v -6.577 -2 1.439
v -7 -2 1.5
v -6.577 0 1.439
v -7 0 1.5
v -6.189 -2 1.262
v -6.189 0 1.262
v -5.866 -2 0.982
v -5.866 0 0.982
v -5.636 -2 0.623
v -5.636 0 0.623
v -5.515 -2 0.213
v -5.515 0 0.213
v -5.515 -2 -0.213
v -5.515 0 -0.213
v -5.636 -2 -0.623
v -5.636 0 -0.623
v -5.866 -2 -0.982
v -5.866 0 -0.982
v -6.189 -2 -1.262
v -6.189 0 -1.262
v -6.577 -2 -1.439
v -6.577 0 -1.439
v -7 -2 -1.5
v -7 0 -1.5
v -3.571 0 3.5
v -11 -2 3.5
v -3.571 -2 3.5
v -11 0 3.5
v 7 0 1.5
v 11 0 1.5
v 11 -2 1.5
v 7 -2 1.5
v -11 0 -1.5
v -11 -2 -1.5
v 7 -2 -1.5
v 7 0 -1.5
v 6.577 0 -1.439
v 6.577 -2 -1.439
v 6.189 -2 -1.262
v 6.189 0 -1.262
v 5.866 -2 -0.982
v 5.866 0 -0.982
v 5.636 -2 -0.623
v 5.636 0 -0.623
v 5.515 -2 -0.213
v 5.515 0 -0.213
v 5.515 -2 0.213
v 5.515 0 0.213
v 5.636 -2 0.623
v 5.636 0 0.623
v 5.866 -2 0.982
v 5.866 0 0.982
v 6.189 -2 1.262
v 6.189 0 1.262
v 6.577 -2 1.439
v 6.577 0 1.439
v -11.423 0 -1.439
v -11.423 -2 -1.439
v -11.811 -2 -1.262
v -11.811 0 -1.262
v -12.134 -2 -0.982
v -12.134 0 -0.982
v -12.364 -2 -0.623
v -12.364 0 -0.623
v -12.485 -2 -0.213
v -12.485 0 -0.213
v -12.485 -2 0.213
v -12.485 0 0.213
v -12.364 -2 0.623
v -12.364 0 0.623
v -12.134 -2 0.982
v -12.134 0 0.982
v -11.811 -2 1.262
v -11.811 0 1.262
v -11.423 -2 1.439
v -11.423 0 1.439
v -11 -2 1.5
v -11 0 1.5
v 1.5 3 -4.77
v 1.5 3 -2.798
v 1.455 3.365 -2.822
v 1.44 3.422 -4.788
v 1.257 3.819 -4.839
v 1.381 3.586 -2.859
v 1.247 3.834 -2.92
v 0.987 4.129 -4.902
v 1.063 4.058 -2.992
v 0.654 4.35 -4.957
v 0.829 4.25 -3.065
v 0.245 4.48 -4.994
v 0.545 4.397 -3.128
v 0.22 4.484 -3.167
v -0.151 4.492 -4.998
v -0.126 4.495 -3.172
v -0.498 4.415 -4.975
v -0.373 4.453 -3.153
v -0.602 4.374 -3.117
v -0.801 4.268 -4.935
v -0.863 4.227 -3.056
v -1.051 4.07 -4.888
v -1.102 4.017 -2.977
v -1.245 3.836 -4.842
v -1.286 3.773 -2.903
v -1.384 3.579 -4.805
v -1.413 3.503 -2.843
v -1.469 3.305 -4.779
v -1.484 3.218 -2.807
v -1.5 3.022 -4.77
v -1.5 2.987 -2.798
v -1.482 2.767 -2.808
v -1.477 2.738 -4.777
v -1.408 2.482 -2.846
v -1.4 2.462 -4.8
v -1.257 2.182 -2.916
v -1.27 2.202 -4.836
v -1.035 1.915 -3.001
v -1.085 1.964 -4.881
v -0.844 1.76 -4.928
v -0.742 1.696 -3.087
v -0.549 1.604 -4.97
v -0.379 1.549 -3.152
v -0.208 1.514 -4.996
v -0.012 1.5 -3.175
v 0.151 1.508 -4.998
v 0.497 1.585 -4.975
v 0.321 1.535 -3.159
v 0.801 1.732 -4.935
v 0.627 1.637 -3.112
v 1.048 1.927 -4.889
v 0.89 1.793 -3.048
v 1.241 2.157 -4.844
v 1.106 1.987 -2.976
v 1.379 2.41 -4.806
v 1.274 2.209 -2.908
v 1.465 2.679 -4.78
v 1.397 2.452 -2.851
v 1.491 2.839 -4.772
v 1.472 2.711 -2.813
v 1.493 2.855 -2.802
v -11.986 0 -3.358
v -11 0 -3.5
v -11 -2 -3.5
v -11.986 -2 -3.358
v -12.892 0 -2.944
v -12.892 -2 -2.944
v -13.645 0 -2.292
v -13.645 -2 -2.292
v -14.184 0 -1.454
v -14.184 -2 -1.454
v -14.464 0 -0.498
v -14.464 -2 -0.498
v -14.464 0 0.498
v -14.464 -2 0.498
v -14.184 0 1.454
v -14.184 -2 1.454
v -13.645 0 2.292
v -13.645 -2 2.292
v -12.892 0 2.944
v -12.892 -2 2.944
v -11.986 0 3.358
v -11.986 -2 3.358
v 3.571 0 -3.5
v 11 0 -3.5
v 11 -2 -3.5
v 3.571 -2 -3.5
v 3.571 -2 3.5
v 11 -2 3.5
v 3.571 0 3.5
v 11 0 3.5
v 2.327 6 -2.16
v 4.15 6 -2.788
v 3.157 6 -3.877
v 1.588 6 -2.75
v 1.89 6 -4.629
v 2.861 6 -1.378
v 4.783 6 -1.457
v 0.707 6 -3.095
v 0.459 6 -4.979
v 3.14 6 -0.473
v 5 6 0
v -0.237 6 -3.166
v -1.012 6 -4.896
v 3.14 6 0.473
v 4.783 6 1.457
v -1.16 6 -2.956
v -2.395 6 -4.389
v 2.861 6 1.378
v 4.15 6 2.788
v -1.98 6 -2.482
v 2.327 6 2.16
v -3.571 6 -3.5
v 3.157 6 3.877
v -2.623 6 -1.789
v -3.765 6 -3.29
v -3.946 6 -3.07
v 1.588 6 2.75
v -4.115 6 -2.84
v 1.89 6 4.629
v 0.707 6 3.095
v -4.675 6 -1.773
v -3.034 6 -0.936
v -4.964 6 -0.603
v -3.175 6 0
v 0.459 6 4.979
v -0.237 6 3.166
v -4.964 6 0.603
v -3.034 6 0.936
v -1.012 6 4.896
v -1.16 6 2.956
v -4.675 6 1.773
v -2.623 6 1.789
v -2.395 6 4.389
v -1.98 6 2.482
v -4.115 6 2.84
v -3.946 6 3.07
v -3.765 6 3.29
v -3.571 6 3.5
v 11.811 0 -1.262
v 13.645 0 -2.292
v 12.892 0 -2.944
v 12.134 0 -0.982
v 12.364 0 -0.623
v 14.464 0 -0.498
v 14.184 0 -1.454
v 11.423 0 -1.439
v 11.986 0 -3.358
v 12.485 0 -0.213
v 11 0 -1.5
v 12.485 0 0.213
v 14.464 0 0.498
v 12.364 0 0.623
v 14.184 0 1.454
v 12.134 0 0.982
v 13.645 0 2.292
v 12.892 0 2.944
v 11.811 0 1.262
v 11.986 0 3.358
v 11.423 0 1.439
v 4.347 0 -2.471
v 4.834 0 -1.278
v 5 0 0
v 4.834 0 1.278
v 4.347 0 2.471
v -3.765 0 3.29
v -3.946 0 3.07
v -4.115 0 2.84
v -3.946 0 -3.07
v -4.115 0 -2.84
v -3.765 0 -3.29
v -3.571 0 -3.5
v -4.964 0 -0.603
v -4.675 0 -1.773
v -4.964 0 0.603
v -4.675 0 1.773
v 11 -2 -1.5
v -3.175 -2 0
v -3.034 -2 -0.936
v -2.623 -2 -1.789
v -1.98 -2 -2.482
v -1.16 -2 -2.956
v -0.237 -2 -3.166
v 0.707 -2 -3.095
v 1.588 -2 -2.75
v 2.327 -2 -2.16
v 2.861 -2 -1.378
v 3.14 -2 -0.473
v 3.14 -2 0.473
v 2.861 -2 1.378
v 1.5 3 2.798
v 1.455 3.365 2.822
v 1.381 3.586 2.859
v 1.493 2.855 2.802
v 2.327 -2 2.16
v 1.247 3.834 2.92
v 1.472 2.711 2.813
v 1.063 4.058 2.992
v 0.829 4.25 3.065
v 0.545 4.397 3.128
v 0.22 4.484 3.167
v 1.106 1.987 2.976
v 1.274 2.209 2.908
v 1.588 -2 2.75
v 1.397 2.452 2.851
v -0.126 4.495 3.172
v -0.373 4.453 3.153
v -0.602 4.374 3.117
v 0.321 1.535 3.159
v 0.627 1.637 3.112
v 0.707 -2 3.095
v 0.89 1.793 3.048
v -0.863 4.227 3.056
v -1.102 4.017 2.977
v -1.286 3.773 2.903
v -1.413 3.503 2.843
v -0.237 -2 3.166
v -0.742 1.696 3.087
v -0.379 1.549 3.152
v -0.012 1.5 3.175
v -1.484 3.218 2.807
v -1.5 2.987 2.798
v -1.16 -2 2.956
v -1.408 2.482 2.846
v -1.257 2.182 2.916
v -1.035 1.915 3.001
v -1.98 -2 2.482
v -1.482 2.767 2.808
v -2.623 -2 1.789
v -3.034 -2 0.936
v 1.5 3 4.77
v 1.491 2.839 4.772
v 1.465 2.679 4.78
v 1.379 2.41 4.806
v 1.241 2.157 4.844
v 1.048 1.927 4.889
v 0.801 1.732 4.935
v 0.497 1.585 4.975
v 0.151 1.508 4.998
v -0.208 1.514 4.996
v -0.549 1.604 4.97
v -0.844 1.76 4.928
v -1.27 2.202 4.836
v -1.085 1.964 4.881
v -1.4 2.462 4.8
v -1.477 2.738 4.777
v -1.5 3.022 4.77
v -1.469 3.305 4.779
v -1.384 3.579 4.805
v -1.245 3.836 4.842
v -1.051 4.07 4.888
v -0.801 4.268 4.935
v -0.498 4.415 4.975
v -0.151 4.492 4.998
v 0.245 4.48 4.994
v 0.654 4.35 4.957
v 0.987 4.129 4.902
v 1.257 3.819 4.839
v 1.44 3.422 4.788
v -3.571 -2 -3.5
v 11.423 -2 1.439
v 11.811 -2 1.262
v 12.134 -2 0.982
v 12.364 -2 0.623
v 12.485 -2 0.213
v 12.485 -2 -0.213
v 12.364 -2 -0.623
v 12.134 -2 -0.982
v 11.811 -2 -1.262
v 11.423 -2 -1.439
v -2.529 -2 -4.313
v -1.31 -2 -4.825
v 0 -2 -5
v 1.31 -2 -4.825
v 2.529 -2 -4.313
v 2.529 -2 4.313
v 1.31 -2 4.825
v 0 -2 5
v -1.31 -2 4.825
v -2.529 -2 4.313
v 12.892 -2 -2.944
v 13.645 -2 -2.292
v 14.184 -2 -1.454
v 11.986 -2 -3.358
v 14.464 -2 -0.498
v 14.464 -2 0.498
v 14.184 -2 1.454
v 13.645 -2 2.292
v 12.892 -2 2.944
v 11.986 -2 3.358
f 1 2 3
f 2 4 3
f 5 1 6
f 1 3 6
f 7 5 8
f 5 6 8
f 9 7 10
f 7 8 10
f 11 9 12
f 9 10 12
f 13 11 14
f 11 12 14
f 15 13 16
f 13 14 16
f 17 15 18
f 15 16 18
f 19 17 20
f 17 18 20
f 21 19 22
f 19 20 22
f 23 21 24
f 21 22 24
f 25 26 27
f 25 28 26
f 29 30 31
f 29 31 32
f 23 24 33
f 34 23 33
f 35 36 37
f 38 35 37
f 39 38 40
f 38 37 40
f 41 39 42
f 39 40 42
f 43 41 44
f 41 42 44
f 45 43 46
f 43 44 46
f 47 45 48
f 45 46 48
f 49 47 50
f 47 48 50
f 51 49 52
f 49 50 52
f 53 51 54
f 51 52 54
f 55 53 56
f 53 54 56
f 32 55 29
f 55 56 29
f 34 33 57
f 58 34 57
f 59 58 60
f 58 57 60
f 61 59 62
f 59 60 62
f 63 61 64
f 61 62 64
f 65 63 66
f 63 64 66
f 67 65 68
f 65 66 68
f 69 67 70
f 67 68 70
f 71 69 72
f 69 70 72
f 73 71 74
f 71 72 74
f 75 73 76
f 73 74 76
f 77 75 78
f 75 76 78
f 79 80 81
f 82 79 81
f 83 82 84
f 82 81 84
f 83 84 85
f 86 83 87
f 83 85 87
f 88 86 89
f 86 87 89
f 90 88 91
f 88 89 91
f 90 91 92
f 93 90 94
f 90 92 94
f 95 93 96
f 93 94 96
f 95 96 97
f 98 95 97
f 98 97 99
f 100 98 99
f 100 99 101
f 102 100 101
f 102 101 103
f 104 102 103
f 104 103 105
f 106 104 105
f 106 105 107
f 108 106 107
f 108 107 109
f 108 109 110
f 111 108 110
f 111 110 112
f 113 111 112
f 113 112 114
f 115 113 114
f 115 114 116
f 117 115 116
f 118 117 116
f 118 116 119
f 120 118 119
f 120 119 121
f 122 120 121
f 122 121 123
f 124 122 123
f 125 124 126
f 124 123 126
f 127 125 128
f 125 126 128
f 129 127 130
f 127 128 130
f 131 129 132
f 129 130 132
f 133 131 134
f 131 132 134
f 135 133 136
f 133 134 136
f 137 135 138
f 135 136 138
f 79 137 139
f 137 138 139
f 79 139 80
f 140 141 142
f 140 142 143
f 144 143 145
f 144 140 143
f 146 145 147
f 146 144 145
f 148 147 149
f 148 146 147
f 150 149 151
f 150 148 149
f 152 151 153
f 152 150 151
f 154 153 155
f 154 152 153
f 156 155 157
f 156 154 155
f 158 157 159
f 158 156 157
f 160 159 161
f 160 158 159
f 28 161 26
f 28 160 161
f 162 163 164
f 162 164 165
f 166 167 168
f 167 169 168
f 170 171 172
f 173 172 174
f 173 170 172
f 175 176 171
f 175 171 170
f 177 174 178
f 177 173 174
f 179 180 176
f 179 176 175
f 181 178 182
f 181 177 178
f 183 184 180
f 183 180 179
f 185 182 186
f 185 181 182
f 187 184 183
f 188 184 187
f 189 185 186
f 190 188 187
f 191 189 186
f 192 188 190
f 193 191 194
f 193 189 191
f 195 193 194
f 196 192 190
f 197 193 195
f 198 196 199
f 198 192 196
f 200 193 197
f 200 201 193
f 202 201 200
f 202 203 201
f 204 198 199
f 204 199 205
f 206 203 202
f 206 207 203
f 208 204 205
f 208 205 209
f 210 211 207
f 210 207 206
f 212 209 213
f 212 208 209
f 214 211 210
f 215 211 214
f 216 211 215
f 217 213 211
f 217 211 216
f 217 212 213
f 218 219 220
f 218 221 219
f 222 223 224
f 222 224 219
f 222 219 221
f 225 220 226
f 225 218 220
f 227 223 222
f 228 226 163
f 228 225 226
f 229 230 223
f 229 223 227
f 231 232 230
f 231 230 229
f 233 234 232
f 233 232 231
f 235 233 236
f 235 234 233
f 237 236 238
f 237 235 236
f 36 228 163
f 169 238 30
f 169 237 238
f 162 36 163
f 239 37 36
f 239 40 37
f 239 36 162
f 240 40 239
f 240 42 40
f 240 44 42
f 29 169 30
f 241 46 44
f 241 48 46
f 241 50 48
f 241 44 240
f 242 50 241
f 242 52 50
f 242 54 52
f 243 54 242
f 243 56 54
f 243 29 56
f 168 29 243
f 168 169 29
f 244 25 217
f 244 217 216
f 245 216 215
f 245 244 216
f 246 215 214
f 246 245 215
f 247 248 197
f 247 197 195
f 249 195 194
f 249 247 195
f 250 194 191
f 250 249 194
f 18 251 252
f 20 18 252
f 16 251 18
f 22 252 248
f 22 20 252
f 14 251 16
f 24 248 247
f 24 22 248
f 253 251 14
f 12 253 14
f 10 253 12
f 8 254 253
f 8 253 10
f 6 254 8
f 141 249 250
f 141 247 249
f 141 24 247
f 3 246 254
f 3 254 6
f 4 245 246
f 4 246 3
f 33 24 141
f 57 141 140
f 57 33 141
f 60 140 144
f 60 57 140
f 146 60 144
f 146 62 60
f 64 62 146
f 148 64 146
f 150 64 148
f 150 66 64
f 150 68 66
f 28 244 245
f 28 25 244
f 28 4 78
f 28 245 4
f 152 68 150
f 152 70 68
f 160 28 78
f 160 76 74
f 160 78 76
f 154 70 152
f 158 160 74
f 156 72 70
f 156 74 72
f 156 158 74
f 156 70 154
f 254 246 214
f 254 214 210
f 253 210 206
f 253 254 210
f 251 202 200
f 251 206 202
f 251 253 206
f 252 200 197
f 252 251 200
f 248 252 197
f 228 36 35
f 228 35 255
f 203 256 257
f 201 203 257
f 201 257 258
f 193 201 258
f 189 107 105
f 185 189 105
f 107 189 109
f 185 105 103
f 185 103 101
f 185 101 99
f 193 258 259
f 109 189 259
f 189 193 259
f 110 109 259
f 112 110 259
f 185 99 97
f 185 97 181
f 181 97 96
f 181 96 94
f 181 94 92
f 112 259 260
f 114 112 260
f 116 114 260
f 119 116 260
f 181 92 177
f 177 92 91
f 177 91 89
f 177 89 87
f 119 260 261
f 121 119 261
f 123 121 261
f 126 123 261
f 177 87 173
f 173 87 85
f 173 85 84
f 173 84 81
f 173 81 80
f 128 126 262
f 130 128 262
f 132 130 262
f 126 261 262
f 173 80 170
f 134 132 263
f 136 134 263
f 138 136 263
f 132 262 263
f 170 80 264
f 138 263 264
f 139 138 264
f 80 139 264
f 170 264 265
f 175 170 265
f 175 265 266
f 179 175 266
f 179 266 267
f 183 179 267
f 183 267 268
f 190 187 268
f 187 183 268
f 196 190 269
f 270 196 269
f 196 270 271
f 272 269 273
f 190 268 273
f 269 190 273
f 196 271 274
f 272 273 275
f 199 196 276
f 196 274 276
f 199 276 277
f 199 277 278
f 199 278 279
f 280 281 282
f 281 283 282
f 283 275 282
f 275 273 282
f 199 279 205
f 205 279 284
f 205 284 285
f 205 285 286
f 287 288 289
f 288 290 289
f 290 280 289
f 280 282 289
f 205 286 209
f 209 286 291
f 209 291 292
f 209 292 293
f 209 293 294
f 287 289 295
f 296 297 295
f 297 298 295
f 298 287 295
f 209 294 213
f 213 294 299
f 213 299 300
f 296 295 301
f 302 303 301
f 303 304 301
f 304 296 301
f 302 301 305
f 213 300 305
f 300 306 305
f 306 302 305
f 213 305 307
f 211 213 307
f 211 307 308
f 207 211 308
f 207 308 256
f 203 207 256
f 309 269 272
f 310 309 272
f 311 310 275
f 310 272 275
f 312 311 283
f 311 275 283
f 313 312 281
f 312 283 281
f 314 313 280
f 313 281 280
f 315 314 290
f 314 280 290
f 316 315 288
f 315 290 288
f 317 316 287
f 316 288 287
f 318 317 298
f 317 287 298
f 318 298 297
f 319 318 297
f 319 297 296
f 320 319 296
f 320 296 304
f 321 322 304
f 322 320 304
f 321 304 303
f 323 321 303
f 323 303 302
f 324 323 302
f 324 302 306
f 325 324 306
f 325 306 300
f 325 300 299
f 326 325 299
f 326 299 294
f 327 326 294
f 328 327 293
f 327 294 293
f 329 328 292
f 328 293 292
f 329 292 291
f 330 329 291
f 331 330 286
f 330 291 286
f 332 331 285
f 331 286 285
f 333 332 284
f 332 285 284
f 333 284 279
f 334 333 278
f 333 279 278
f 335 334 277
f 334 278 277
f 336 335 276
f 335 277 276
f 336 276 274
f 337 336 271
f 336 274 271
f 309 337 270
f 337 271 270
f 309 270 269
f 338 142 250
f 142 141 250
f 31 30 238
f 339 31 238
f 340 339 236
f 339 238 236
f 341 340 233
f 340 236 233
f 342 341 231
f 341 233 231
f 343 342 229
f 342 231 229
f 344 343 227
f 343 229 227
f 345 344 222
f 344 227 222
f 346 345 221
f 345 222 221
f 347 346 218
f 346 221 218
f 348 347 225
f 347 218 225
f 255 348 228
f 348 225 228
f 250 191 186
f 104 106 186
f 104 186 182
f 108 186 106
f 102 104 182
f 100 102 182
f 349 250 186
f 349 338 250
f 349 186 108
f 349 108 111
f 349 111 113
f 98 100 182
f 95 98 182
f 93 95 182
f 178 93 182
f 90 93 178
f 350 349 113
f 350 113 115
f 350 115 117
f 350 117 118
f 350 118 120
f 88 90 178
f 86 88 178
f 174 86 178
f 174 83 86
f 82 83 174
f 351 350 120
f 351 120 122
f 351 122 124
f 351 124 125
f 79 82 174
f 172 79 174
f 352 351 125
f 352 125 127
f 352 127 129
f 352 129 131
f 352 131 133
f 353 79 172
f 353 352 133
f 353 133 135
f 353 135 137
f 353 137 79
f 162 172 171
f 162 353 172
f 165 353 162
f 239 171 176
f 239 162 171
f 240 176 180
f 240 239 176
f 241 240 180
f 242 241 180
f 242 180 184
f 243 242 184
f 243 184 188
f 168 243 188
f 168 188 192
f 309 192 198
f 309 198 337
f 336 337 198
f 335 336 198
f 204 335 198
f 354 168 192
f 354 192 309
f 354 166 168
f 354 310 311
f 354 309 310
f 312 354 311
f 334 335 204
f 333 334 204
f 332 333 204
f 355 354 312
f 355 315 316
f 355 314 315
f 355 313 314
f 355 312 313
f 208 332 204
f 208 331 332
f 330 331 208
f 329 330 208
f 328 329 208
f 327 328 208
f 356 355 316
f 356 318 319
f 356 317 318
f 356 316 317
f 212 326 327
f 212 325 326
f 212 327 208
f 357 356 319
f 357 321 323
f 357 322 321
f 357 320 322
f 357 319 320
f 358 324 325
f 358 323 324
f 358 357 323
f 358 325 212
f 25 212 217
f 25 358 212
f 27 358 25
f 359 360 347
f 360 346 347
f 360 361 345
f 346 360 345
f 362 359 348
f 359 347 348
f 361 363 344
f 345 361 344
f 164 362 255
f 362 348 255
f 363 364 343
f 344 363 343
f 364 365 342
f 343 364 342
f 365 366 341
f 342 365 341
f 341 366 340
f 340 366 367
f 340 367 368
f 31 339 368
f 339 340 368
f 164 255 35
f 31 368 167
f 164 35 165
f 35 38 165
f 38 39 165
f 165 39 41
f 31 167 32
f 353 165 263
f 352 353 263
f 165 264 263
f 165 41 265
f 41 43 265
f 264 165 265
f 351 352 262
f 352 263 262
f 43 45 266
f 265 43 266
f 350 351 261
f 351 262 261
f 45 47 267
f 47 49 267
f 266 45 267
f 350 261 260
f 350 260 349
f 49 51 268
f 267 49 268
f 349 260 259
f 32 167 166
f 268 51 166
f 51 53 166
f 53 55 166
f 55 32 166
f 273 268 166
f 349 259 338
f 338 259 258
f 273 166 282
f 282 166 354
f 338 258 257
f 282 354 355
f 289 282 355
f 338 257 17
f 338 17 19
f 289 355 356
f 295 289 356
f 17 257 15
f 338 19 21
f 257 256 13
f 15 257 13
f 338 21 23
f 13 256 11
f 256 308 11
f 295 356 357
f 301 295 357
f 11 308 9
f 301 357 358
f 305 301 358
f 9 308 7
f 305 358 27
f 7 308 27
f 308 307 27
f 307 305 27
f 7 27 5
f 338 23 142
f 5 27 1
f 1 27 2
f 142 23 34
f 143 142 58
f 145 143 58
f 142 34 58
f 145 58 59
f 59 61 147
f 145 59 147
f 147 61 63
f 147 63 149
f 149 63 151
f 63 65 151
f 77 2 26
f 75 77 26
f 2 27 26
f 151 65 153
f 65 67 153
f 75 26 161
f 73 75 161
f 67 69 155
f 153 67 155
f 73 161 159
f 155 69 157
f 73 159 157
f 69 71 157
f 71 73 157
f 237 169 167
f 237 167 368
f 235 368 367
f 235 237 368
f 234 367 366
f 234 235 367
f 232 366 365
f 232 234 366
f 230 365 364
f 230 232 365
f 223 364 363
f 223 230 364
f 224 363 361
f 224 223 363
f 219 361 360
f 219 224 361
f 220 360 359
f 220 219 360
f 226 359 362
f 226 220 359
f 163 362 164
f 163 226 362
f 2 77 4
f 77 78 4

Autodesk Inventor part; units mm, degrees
ref_plane "YZ Plane" through (0, 0, 0) normal (1, 0, 0) x (0, 1, 0)
ref_plane "XZ Plane" through (0, 0, 0) normal (0, 1, 0) x (-1, 0, 0)
sketch "Sketch1" plane through (0, 0, 0) normal (0, 1, 0) x (-1, 0, 0)
  circle A0 centre (0, 0) radius 3.175
  arc A1 (4.1151, 2.84) -> (3.5707, 3.5) centre (0, 0) ccw
  arc A2 (-11, 3.5) -> (-11, -3.5) centre (-11, 0) ccw
  line L0 (0, 0) -> (0, -5) construction
  arc A3 (4.1151, -2.84) -> (4.1151, 2.84) centre (0, 0) ccw
  line L1 (-7, 0) -> (-11, 0) construction
  line L2 (-7, -1.5) -> (-11, -1.5)
  line L3 (-11, 1.5) -> (-7, 1.5)
  arc A4 (-7, -1.5) -> (-7, 1.5) centre (-7, 0) ccw
  arc A5 (-11, 1.5) -> (-11, -1.5) centre (-11, 0) ccw
  line L4 (-11, 3.5) -> (-3.5707, 3.5)
  line L5 (-11, -3.5) -> (-3.5707, -3.5)
  line L6 (0, 0) -> (0, 3.175) construction
  arc A6 (11, -3.5) -> (11, 3.5) centre (11, 0) ccw
  line L7 (7, -1.5) -> (11, -1.5)
  line L8 (11, 1.5) -> (7, 1.5)
  arc A7 (7, 1.5) -> (7, -1.5) centre (7, 0) ccw
  arc A8 (11, -1.5) -> (11, 1.5) centre (11, 0) ccw
  line L9 (11, 3.5) -> (3.5707, 3.5)
  line L10 (11, -3.5) -> (3.5707, -3.5)
  arc A9 (3.5707, 3.5) -> (3.5707, -3.5) centre (0, 0) ccw
  arc A10 (3.5707, -3.5) -> (4.1151, -2.84) centre (0, 0) ccw
  point P0 (-9, 0)
  dimension "d0" = 6.35
  dimension "d1" = 10
  dimension "d6" = 3.5
  dimension "d15" = 3
  dimension "d16" = 4
  dimension "d17" = 7
extrude "Extrusion1" add sketch "Sketch1" against normal blind 2
extrude "Extrusion2" add sketch "Sketch1" along normal blind 6 contours A3 A10 A9 A1
sketch "Sketch2" plane through (0, 0, 0) normal (0, 0, 1) x (1, 0, 0)
  circle A0 centre (0, 3) radius 1.5
  line L0 (5, 6) -> (5, 0) projected
  point P0 (0, 0)
  point P1 (5, 3)
  dimension "d11" = 3
extrude "Extrusion3" cut sketch "Sketch2" along normal through all both and the other way through all
ref_plane "Work Plane1" through (0, 0, 5) normal (0, 0, 1) x (1, 0, 0)
properties part number "EncoderWheelAdapterSlotted" material "ABS Plastic"
